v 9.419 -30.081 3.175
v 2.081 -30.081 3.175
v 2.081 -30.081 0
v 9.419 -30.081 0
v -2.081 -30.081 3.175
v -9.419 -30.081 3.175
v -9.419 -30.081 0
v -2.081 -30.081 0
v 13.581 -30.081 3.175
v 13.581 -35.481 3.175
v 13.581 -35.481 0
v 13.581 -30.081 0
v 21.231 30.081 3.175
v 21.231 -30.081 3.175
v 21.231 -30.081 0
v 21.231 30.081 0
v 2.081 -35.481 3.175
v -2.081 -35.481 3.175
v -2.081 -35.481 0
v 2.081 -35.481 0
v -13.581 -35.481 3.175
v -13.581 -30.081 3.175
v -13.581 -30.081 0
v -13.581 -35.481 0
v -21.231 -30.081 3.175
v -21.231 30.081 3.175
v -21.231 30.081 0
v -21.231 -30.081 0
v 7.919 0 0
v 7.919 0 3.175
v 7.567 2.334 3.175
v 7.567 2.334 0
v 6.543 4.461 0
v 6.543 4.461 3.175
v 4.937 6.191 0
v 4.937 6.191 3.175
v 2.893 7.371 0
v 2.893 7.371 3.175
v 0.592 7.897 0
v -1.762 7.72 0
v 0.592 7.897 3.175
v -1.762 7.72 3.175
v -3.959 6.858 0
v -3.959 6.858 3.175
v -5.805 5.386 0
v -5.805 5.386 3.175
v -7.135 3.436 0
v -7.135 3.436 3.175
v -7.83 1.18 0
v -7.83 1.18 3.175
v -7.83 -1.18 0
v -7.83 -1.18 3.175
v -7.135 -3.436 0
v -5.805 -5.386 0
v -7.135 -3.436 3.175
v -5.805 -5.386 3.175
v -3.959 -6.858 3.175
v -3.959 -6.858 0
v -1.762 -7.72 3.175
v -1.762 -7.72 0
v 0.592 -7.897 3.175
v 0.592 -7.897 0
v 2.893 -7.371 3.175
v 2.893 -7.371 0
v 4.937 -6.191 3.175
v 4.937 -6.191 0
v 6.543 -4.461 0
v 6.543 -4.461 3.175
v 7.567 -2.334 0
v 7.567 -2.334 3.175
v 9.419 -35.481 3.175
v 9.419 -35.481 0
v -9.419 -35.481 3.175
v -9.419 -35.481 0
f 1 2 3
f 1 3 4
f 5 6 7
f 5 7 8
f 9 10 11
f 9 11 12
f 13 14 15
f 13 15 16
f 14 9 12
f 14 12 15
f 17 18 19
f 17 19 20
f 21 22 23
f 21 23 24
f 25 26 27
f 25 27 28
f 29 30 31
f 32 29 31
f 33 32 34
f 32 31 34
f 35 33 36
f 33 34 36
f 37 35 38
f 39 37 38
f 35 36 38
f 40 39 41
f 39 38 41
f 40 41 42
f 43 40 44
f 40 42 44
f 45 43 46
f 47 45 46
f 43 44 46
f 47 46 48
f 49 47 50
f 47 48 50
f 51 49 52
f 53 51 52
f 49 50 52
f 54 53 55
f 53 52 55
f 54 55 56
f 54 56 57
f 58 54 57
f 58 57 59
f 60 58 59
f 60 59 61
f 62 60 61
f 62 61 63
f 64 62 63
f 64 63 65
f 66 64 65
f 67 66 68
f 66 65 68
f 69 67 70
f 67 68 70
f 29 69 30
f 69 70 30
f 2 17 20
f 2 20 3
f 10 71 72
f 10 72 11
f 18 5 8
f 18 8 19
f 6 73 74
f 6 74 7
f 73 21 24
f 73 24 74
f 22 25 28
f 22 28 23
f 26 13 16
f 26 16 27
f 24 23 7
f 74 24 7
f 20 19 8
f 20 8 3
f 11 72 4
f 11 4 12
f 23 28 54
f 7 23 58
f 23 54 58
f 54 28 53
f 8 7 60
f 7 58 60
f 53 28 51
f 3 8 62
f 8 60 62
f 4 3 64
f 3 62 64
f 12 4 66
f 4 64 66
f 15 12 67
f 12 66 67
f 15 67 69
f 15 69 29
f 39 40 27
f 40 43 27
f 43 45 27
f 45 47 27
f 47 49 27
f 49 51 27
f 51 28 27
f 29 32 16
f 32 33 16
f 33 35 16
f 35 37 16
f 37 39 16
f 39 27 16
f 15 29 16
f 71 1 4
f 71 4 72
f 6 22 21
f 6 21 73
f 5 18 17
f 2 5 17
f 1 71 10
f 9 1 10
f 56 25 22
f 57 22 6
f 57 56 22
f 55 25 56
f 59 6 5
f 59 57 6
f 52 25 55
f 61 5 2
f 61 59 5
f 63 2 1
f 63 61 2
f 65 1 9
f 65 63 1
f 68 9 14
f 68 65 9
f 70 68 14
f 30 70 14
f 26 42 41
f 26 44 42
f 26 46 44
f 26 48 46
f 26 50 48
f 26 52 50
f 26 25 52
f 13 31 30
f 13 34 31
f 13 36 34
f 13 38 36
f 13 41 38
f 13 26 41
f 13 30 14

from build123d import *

# Parameters (mm, degrees)
SKETCH1_W           = 42.3
SKETCH1_H           = 60
SKETCH1_R           = 8
SKETCH1_W_2         = 4
SKETCH1_H_2         = 5.4
BOSS_EXTRUDE1_DEPTH = 3.175
SKETCH2_R           = 7.95936
BOSS_EXTRUDE3_DEPTH = 3.175
SKETCH3_R           = 7.91872
BOSS_EXTRUDE4_DEPTH = 3.175


with BuildPart() as part:
    # Sketch1 → Boss-Extrude1 (new body)
    with BuildSketch(Plane.XY):
        Rectangle(SKETCH1_W, SKETCH1_H)
        Circle(SKETCH1_R, mode=Mode.SUBTRACT)
        with Locations((0, -32.7)):
            Rectangle(SKETCH1_W_2, SKETCH1_H_2)
        with Locations((-11.5, -32.7)):
            Rectangle(SKETCH1_W_2, SKETCH1_H_2)
        with Locations((11.5, -32.7)):
            Rectangle(SKETCH1_W_2, SKETCH1_H_2)
    extrude(amount=BOSS_EXTRUDE1_DEPTH)

    # Sketch2 → Boss-Extrude3 (add)
    with BuildSketch(Plane.XY.offset(3.175)):
        Polygon((21.19064, -30.04064), (21.19064, 30.04064), (-21.19064, 30.04064), (-21.19064, -30.04064), (-13.54064, -30.04064), (-13.54064, -35.44064), (-9.45936, -35.44064), (-9.45936, -30.04064), (-2.04064, -30.04064), (-2.04064, -35.44064), (2.04064, -35.44064), (2.04064, -30.04064), (9.45936, -30.04064), (9.45936, -35.44064), (13.54064, -35.44064), (13.54064, -30.04064), align=None)
        Circle(SKETCH2_R, mode=Mode.SUBTRACT)
    extrude(amount=-BOSS_EXTRUDE3_DEPTH)

    # Sketch3 → Boss-Extrude4 (add)
    with BuildSketch(Plane.XY.offset(3.175)):
        Polygon((-21.23128, 30.08128), (-21.23128, -30.08128), (-13.58128, -30.08128), (-13.58128, -35.48128), (-9.41872, -35.48128), (-9.41872, -30.08128), (-2.08128, -30.08128), (-2.08128, -35.48128), (2.08128, -35.48128), (2.08128, -30.08128), (9.41872, -30.08128), (9.41872, -35.48128), (13.58128, -35.48128), (13.58128, -30.08128), (21.23128, -30.08128), (21.23128, 30.08128), align=None)
        Circle(SKETCH3_R, mode=Mode.SUBTRACT)
    extrude(amount=-BOSS_EXTRUDE4_DEPTH)


solid = part.part
